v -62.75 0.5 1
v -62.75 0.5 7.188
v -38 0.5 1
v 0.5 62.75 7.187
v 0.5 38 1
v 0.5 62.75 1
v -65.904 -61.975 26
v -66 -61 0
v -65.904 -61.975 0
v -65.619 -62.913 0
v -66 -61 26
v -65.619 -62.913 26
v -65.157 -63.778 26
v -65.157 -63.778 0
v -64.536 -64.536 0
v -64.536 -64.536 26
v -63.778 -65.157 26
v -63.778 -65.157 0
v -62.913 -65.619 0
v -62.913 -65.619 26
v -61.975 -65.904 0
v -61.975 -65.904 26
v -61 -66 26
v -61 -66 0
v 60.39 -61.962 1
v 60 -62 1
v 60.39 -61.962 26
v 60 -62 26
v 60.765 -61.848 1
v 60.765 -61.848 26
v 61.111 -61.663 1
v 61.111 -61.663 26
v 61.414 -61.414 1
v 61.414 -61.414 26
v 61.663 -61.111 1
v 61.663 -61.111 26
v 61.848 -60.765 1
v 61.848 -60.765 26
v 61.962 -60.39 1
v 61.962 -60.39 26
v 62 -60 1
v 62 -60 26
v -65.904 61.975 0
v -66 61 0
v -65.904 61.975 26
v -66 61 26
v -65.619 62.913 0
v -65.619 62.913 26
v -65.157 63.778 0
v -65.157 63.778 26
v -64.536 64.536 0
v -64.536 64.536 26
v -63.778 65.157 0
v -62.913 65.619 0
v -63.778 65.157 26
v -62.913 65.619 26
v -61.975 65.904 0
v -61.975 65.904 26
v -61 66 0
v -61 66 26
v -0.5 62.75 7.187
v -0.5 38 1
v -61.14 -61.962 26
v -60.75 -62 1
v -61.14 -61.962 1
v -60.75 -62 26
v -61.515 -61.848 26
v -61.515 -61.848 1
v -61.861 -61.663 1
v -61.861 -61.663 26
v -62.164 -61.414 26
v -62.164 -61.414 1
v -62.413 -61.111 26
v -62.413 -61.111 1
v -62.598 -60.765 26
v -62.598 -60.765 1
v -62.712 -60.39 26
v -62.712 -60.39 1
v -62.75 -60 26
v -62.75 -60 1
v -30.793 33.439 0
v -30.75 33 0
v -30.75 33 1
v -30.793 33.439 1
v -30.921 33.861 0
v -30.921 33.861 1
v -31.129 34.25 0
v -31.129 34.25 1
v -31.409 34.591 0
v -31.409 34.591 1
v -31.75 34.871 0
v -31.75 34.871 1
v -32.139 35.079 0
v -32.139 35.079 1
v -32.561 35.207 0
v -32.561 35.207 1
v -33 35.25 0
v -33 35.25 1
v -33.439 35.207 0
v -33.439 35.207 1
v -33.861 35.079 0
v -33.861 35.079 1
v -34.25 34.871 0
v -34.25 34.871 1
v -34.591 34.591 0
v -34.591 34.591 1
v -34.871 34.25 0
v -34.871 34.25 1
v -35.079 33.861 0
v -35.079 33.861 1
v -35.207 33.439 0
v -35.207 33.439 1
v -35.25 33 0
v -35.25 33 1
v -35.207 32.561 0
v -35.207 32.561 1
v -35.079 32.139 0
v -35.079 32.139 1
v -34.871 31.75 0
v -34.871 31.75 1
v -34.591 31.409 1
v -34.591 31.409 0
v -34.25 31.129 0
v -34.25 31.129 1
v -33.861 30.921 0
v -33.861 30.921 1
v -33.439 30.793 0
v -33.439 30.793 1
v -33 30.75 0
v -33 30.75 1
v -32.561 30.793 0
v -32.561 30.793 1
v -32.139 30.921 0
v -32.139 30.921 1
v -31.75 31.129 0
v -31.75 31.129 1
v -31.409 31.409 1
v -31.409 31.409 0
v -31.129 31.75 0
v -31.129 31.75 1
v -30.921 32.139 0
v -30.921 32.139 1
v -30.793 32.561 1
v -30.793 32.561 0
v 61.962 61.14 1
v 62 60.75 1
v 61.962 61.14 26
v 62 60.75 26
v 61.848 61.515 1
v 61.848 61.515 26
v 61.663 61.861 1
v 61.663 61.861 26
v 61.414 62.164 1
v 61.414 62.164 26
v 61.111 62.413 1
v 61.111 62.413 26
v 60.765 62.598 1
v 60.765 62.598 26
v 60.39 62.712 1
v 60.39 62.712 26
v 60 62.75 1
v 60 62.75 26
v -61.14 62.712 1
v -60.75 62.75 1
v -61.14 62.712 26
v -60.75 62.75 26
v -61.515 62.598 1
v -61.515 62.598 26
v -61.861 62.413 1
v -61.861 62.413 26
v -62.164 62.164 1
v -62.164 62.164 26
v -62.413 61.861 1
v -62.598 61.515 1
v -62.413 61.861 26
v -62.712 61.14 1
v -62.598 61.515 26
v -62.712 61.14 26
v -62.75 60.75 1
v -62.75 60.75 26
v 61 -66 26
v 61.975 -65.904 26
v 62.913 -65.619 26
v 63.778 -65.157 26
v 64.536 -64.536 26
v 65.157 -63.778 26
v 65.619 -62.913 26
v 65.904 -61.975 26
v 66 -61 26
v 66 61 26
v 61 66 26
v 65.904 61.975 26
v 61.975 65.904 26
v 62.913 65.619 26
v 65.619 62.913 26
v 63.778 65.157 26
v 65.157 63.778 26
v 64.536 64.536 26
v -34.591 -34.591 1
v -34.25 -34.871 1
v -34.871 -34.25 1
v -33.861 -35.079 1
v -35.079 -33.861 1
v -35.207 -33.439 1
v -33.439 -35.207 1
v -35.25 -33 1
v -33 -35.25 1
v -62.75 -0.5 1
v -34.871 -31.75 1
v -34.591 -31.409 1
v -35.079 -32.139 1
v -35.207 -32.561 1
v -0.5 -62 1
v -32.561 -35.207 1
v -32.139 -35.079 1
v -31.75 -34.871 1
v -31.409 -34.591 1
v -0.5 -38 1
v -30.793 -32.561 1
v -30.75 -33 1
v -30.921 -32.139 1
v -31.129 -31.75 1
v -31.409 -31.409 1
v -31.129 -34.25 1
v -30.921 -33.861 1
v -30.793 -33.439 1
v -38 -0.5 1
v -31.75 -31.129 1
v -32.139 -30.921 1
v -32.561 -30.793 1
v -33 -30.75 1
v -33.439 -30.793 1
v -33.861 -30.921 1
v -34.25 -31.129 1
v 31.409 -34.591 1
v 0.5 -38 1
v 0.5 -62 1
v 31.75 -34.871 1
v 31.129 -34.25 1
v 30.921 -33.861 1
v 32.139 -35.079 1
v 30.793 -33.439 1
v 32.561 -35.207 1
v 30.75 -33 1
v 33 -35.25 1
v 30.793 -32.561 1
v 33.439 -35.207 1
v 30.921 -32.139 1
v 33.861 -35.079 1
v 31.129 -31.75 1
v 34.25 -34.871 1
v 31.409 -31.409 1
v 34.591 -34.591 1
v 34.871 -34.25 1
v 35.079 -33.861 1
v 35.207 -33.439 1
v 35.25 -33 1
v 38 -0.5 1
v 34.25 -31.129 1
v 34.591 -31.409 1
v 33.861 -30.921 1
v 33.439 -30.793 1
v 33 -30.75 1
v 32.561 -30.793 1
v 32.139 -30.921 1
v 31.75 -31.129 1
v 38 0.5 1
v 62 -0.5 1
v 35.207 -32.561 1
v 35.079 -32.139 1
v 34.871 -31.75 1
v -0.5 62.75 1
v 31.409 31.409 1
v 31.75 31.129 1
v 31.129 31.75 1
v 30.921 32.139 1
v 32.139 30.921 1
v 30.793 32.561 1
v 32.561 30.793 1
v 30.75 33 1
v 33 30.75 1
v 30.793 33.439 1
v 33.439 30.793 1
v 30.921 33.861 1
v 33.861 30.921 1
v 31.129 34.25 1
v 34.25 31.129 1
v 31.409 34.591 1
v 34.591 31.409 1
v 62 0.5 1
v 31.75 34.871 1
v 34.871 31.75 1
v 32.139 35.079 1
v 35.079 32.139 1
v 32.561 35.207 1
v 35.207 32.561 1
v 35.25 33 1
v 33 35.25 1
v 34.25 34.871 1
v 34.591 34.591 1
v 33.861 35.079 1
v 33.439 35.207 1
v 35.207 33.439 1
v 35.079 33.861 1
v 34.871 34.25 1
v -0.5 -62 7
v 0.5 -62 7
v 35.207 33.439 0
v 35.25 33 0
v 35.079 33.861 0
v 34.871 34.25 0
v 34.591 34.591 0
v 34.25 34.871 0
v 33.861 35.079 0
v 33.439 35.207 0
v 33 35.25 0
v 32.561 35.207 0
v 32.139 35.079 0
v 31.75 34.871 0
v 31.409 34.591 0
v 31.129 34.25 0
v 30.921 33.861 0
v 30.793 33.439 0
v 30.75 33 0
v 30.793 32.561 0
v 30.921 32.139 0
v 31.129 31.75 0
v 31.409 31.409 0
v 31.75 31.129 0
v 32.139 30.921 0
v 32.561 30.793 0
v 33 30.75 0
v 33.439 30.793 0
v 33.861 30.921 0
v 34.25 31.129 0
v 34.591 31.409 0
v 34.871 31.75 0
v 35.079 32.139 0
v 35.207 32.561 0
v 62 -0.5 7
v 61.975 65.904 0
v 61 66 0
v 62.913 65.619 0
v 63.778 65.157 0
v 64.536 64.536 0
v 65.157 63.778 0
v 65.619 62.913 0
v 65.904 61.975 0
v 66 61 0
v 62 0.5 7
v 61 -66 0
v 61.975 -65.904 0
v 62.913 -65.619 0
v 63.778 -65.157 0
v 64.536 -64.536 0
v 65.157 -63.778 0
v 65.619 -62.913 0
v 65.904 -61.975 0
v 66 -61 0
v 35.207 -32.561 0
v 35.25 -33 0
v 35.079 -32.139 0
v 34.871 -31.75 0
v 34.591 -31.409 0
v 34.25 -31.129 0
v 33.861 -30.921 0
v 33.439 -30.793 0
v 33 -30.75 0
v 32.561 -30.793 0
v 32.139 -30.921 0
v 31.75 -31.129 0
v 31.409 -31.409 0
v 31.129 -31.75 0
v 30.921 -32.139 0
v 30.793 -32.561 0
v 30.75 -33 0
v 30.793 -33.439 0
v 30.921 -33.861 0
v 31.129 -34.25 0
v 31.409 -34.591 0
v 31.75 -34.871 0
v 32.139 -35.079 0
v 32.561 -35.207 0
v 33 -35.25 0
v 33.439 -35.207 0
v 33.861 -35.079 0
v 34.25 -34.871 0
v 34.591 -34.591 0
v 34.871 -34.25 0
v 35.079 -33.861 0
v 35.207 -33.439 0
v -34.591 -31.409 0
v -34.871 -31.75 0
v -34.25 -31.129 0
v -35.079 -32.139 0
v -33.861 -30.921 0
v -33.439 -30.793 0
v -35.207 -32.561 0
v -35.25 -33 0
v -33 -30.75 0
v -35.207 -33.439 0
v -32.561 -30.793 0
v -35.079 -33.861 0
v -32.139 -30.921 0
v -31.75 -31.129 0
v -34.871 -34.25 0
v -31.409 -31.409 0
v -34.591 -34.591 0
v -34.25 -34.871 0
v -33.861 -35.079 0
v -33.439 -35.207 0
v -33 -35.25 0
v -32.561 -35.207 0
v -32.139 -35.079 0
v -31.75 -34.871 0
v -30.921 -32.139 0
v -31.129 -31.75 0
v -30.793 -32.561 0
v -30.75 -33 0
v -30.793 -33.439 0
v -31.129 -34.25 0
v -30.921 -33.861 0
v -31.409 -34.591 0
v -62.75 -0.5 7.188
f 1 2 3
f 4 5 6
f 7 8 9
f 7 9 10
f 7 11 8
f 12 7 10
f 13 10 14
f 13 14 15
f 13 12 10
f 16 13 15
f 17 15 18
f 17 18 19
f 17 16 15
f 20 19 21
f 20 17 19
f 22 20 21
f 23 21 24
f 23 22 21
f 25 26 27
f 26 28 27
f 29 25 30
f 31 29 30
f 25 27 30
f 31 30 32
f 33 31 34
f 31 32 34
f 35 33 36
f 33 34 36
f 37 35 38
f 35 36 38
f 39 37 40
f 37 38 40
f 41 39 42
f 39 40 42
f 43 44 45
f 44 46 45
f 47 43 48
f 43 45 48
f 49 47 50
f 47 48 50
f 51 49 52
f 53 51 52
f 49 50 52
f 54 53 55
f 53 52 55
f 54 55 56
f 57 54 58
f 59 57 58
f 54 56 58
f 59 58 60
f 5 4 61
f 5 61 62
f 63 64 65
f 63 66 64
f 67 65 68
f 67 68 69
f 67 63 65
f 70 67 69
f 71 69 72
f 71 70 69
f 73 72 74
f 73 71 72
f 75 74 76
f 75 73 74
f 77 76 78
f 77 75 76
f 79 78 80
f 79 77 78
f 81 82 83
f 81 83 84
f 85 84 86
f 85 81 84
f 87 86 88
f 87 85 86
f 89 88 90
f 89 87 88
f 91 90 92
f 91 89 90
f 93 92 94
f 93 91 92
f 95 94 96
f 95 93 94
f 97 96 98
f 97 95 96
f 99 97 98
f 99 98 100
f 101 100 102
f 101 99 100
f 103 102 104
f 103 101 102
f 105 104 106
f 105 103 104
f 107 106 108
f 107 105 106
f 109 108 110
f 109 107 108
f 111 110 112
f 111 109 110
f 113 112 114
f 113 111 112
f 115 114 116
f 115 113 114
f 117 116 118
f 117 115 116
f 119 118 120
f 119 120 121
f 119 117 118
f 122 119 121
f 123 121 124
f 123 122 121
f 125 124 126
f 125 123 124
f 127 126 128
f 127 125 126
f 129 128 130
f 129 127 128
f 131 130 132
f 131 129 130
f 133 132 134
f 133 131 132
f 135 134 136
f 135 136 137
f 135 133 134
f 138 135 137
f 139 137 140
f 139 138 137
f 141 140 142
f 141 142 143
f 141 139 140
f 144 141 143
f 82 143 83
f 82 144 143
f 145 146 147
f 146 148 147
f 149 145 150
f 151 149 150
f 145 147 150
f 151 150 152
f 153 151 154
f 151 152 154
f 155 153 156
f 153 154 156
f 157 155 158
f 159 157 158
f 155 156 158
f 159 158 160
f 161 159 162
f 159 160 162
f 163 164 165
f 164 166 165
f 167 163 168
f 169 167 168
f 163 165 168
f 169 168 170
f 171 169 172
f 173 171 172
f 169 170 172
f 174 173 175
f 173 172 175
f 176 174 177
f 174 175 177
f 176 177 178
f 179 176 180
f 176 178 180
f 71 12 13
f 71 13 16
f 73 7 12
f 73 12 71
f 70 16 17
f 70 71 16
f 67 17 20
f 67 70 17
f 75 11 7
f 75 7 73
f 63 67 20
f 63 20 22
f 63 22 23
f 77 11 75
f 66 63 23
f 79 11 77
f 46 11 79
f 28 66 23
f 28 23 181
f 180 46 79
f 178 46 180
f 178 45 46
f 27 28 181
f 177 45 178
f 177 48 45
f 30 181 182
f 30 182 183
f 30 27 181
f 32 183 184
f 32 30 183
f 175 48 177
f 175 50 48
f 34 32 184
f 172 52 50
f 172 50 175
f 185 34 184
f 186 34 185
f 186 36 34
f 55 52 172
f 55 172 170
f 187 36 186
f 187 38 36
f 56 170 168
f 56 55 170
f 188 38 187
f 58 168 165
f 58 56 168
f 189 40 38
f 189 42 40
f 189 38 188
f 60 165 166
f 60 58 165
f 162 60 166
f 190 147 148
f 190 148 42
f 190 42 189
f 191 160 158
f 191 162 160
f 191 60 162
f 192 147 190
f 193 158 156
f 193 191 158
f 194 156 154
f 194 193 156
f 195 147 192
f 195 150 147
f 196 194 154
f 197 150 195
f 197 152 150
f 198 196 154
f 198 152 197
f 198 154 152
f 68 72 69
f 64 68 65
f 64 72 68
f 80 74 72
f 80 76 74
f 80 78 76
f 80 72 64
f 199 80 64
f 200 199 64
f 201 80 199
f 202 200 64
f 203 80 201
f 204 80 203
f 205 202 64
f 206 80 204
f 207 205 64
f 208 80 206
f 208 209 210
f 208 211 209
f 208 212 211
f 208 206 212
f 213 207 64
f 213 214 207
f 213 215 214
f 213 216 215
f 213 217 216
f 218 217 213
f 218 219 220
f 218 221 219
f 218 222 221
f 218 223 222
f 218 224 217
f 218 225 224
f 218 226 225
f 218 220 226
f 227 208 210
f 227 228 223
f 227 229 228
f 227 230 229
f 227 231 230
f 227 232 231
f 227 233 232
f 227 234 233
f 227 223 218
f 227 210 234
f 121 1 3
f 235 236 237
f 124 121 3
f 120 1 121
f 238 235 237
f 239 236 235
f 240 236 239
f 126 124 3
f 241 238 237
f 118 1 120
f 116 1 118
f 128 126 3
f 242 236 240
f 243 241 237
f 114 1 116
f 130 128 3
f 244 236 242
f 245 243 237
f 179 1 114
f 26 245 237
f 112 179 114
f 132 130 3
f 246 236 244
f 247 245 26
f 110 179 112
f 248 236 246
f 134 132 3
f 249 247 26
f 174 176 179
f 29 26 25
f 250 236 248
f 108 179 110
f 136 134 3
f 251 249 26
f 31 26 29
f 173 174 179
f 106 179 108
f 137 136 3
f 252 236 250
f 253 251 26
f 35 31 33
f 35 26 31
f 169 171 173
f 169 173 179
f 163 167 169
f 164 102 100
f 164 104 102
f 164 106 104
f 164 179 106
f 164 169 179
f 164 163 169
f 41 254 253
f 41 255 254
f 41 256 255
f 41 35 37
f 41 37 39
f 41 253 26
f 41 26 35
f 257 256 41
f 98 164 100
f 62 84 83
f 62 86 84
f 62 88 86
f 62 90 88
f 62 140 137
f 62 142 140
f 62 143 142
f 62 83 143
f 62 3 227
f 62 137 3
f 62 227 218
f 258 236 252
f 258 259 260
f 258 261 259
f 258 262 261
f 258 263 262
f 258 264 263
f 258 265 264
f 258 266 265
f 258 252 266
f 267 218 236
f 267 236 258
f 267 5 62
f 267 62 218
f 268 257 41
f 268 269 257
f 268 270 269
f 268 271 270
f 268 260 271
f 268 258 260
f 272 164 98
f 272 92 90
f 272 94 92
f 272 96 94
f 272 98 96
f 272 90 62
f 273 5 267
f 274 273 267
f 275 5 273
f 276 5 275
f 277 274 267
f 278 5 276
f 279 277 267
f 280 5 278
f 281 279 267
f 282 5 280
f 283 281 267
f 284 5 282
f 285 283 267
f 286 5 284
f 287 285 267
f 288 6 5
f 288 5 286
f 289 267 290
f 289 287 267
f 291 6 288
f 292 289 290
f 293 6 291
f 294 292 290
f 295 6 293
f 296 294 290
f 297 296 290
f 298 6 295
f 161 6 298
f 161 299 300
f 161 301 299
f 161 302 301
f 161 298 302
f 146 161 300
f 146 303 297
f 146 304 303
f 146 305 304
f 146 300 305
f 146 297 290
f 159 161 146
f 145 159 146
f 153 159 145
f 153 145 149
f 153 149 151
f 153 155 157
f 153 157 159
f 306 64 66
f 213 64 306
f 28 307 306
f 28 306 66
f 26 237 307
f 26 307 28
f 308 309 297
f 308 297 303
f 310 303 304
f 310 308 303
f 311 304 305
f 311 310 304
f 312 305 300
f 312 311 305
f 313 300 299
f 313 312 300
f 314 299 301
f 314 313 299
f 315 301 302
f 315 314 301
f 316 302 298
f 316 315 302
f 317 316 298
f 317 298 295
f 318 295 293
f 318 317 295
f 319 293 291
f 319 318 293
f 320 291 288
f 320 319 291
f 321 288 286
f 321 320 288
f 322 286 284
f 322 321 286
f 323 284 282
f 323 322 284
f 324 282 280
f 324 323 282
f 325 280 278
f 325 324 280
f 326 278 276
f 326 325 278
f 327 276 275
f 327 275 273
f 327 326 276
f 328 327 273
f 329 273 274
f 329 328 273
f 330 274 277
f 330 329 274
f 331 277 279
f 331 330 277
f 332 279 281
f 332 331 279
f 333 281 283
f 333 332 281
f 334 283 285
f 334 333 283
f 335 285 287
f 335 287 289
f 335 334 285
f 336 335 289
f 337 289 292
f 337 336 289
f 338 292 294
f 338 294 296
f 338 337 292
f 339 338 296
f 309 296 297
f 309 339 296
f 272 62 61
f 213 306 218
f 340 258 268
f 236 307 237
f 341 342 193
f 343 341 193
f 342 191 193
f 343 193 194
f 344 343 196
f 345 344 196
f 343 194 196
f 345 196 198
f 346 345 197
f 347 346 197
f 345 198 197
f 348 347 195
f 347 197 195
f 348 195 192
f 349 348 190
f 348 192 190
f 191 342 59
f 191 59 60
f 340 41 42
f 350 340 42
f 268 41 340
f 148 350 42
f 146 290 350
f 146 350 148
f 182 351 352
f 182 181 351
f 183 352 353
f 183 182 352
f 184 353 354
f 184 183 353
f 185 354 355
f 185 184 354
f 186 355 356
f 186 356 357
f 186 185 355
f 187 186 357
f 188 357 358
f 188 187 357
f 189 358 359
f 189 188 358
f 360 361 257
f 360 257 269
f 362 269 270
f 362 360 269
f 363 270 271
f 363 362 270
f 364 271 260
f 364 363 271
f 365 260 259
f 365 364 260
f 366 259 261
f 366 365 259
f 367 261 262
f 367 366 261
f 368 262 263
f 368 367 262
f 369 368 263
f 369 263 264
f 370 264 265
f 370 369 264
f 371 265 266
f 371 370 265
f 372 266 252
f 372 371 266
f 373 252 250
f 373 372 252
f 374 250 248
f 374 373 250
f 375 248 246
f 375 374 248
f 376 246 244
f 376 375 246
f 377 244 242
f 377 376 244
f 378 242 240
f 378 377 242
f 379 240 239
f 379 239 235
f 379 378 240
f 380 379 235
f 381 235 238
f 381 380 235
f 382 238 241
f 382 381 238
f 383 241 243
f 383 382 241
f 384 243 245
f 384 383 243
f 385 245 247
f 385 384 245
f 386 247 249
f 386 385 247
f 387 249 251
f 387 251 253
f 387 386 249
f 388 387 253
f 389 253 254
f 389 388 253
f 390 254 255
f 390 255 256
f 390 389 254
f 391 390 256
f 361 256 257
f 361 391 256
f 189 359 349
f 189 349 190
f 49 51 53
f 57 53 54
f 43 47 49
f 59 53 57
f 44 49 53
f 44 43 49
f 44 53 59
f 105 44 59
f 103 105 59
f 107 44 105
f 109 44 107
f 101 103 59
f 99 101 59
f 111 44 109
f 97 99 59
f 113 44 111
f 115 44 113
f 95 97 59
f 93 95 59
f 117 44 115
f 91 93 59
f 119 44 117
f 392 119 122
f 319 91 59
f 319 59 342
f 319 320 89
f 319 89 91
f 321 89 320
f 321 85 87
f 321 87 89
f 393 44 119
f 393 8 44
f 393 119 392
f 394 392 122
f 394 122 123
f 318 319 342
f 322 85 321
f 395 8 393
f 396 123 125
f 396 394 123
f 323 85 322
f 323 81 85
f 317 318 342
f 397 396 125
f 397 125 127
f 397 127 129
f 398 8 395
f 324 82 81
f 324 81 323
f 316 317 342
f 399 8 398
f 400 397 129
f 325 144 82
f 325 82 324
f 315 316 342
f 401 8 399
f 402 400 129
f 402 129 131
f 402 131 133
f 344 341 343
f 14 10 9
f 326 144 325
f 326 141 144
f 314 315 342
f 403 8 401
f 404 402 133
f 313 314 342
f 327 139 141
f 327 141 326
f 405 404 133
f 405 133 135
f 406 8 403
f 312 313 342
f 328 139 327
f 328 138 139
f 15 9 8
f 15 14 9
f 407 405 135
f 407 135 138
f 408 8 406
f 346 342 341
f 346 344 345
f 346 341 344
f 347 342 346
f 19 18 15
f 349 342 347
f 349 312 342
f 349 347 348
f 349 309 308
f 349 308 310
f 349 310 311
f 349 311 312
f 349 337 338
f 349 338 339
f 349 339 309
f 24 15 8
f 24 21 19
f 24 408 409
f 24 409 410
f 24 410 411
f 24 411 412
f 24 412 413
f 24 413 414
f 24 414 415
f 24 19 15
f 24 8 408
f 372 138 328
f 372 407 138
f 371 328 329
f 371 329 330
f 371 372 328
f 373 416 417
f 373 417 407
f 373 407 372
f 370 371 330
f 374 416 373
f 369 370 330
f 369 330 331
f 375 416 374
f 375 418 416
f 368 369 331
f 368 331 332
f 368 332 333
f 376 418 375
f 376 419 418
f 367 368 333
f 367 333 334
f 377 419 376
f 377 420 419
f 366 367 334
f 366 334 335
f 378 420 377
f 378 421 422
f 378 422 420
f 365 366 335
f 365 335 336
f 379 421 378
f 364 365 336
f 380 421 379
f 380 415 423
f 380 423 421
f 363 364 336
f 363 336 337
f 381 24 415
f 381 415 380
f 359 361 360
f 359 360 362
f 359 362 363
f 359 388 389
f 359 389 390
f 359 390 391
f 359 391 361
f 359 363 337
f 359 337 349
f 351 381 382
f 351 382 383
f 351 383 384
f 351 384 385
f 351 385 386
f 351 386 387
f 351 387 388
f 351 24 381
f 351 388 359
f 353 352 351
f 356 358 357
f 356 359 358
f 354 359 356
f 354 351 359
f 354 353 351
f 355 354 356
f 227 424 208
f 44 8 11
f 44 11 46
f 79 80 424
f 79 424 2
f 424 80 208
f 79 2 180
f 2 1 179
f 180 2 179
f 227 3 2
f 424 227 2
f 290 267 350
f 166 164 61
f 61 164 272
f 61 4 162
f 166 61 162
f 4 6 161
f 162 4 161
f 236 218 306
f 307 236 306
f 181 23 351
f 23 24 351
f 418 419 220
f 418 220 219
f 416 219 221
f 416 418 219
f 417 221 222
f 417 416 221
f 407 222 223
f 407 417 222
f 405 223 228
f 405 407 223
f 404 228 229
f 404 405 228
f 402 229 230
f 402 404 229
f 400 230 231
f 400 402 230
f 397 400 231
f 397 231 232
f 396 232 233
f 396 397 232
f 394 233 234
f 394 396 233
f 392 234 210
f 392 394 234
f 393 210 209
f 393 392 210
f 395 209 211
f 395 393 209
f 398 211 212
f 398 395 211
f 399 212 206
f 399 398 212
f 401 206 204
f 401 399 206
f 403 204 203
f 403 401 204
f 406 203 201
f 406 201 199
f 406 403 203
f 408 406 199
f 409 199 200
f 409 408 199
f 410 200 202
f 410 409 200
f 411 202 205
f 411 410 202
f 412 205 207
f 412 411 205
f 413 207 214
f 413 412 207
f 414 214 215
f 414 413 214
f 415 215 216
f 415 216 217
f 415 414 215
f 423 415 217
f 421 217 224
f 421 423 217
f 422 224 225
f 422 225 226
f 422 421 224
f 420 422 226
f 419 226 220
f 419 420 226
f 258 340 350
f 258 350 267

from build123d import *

# Parameters (mm, degrees)
F0_W     = 124.75
F0_H     = 124.75
F0_R     = 2.25
F1_DEPTH = 1
F0_W_2   = 132
F0_H_2   = 132
F2_DEPTH = 26
F4_DEPTH = 0.5
F6_DEPTH = 0.5
F7_R     = 2
F8_R     = 5


with BuildPart() as f1:
    # F0 (on Top) → F1 (new body)
    with BuildSketch(Plane.XY):
        with Locations((-0.375, 0.375)):
            Rectangle(F0_W, F0_H)
        with Locations((-33, -33)):
            Circle(F0_R, mode=Mode.SUBTRACT)
        with Locations((33, -33)):
            Circle(F0_R, mode=Mode.SUBTRACT)
        with Locations((-33, 33)):
            Circle(F0_R, mode=Mode.SUBTRACT)
        with Locations((33, 33)):
            Circle(F0_R, mode=Mode.SUBTRACT)
    extrude(amount=F1_DEPTH)

    # F0 (on Top) → F2 (join)
    with BuildSketch(Plane.XY):
        Rectangle(F0_W_2, F0_H_2)
        with Locations((-0.375, 0.375)):
            Rectangle(F0_W, F0_H, mode=Mode.SUBTRACT)
    extrude(amount=F2_DEPTH)

    # F3 (on Right) → F4 (join, symmetric)
    with BuildSketch(Plane.YZ):
        Polygon((-66, 0), (-34, 0), (-66, 8), align=None)
        Polygon((34, 0), (66, 0), (66, 8), align=None)
    extrude(amount=F4_DEPTH, both=True)

    # F5 (on Front) → F6 (join, symmetric)
    with BuildSketch(Plane.XZ):
        Polygon((-34, 0), (-66, 8), (-66, 0), align=None)
        Polygon((66, 8), (34, 0), (66, 0), align=None)
    extrude(amount=F6_DEPTH, both=True)

    # F7
    f7_edges = [f1.edges().sort_by_distance(p)[0] for p in [
        (-62.75, 62.75, 13.5),
        (62, 62.75, 13.5),
        (62, -62, 13.5),
        (-62.75, -62, 13.5),
    ]]
    fillet(f7_edges, radius=F7_R)

    # F8
    f8_edges = [f1.edges().sort_by_distance(p)[0] for p in [
        (-66, -66, 13),
        (66, -66, 13),
        (66, 66, 13),
        (-66, 66, 13),
    ]]
    fillet(f8_edges, radius=F8_R)


solid = f1.part
